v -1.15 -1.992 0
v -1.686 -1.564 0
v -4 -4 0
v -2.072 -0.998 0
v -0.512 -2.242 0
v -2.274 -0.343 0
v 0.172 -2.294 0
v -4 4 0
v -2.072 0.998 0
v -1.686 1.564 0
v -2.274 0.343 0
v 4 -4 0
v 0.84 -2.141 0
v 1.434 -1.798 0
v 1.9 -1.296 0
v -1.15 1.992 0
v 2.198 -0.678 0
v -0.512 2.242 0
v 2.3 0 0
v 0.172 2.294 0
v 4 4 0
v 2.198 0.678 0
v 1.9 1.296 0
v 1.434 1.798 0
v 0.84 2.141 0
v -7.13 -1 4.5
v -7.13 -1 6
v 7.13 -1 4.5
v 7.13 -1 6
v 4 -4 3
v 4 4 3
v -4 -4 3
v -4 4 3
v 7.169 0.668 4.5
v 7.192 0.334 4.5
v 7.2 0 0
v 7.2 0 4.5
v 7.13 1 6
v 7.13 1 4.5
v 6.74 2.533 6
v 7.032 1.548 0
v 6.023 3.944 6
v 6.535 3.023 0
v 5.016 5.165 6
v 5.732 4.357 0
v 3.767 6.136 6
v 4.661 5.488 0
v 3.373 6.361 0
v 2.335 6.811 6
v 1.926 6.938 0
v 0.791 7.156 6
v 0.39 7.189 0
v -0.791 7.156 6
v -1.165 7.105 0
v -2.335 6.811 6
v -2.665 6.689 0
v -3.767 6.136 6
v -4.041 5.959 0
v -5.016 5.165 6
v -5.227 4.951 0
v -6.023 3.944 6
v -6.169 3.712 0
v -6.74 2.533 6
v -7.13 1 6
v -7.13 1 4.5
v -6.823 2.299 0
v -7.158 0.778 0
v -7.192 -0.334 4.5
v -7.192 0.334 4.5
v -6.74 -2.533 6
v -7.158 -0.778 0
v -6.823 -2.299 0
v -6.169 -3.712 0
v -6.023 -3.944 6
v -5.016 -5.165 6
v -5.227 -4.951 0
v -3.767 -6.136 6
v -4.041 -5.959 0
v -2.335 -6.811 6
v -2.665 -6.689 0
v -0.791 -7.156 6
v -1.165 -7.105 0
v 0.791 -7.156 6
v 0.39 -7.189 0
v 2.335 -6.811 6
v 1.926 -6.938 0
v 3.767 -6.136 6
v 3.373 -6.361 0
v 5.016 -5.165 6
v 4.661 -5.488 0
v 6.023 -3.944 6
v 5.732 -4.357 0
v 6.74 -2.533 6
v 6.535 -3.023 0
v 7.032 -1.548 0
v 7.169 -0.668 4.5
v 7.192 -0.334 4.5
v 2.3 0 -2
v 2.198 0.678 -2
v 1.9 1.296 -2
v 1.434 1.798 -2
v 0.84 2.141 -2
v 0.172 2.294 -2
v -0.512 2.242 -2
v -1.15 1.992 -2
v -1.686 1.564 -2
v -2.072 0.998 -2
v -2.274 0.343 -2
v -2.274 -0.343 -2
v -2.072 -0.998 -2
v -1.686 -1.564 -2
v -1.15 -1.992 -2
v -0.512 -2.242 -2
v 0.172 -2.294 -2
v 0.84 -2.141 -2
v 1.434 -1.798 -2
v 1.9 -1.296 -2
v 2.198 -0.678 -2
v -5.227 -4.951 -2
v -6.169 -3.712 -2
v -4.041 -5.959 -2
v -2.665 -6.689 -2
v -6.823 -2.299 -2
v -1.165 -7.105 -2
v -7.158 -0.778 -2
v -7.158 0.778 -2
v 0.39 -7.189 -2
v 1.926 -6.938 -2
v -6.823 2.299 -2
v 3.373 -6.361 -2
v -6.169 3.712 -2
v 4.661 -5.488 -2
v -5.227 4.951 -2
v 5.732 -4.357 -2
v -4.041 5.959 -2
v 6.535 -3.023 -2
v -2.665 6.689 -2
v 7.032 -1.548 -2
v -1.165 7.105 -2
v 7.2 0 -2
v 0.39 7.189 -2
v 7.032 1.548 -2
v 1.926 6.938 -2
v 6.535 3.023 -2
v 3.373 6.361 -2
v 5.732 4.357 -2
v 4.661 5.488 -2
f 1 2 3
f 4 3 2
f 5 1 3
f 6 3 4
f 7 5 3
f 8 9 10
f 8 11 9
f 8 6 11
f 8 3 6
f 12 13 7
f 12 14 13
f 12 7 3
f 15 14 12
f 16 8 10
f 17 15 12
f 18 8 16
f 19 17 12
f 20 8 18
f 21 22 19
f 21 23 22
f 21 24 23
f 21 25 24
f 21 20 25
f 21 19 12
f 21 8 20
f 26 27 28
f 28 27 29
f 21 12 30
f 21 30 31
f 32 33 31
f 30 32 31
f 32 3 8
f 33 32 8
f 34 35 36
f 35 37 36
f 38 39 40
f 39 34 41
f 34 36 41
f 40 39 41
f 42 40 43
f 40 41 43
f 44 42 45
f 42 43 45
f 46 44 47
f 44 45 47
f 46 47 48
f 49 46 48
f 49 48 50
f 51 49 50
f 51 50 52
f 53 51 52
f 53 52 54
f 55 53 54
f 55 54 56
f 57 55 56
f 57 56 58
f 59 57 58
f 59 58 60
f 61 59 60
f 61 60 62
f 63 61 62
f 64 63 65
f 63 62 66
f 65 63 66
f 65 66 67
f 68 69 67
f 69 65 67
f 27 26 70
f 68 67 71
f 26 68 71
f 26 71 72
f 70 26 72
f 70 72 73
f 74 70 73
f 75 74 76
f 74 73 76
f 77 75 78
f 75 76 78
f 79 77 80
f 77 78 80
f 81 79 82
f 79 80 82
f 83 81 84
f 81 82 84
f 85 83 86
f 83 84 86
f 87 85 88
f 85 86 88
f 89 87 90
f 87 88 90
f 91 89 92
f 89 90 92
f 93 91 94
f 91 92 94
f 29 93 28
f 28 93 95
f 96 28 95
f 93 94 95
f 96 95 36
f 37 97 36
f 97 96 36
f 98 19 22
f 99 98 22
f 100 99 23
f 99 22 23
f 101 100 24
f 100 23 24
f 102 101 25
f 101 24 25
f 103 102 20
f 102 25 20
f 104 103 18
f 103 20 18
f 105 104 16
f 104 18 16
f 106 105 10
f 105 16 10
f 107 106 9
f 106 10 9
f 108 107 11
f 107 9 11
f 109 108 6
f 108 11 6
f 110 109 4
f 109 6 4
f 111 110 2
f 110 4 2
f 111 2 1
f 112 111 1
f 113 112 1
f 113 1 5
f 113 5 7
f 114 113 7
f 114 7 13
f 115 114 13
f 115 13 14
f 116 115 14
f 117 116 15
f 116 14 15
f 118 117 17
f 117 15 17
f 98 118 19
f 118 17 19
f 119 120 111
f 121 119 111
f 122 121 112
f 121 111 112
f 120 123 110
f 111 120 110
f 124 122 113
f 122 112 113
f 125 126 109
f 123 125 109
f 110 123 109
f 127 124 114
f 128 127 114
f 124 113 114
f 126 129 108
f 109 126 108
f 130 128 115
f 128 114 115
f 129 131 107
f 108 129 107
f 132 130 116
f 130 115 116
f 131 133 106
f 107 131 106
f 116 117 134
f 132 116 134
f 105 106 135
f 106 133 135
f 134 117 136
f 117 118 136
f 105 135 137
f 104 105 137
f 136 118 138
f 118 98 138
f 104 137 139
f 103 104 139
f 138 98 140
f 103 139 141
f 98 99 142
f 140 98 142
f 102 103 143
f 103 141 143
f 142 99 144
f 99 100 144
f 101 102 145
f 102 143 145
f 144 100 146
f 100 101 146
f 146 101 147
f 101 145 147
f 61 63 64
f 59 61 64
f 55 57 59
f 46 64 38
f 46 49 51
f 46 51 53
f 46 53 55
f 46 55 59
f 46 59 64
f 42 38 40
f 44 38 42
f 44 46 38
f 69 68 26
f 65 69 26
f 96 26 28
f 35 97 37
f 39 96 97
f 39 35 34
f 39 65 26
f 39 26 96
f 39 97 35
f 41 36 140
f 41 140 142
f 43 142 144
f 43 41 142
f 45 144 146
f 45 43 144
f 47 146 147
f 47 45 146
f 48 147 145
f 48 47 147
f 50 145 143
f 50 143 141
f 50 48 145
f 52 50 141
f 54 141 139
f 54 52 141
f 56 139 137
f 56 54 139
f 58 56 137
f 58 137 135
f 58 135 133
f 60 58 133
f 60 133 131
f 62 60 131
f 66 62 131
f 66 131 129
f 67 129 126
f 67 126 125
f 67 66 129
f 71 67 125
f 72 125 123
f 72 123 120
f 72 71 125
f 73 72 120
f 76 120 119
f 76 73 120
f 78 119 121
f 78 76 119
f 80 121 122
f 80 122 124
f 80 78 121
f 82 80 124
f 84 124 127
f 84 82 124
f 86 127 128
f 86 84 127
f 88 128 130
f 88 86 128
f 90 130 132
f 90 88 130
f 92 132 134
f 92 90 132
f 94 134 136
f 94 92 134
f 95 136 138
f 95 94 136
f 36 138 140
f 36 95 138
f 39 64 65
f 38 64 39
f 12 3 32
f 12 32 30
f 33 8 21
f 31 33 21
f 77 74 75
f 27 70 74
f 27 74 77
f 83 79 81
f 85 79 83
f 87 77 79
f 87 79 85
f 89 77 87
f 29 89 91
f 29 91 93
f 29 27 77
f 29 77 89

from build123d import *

# Parameters (mm, degrees)
SKETCH_R        = 7.2
SKETCH_R_2      = 2.3
PAD_DEPTH       = 2
SKETCH001_R     = 7.2
PAD001_DEPTH    = 6
SKETCH002_W     = 8
SKETCH002_H     = 8
POCKET_DEPTH    = 3
SKETCH003_W     = 26.953154
SKETCH003_H     = 2
POCKET001_DEPTH = 3.5


with BuildPart() as part:
    # Sketch → Pad (new body)
    with BuildSketch(Plane.XY):
        Circle(SKETCH_R)
        Circle(SKETCH_R_2, mode=Mode.SUBTRACT)
    extrude(amount=-PAD_DEPTH)

    # Sketch001 → Pad001 (join)
    with BuildSketch(Plane.XY):
        Circle(SKETCH001_R)
    extrude(amount=PAD001_DEPTH)

    # Sketch002 → Pocket (cut)
    with BuildSketch(Plane.XY):
        Rectangle(SKETCH002_W, SKETCH002_H)
    extrude(amount=POCKET_DEPTH, mode=Mode.SUBTRACT)

    # Sketch003 (on DatumPlane) → Pocket001 (cut, symmetric)
    with BuildSketch(Plane.XY.offset(8)):
        Rectangle(SKETCH003_W, SKETCH003_H)
    extrude(amount=POCKET001_DEPTH, both=True, mode=Mode.SUBTRACT)


solid = part.part
